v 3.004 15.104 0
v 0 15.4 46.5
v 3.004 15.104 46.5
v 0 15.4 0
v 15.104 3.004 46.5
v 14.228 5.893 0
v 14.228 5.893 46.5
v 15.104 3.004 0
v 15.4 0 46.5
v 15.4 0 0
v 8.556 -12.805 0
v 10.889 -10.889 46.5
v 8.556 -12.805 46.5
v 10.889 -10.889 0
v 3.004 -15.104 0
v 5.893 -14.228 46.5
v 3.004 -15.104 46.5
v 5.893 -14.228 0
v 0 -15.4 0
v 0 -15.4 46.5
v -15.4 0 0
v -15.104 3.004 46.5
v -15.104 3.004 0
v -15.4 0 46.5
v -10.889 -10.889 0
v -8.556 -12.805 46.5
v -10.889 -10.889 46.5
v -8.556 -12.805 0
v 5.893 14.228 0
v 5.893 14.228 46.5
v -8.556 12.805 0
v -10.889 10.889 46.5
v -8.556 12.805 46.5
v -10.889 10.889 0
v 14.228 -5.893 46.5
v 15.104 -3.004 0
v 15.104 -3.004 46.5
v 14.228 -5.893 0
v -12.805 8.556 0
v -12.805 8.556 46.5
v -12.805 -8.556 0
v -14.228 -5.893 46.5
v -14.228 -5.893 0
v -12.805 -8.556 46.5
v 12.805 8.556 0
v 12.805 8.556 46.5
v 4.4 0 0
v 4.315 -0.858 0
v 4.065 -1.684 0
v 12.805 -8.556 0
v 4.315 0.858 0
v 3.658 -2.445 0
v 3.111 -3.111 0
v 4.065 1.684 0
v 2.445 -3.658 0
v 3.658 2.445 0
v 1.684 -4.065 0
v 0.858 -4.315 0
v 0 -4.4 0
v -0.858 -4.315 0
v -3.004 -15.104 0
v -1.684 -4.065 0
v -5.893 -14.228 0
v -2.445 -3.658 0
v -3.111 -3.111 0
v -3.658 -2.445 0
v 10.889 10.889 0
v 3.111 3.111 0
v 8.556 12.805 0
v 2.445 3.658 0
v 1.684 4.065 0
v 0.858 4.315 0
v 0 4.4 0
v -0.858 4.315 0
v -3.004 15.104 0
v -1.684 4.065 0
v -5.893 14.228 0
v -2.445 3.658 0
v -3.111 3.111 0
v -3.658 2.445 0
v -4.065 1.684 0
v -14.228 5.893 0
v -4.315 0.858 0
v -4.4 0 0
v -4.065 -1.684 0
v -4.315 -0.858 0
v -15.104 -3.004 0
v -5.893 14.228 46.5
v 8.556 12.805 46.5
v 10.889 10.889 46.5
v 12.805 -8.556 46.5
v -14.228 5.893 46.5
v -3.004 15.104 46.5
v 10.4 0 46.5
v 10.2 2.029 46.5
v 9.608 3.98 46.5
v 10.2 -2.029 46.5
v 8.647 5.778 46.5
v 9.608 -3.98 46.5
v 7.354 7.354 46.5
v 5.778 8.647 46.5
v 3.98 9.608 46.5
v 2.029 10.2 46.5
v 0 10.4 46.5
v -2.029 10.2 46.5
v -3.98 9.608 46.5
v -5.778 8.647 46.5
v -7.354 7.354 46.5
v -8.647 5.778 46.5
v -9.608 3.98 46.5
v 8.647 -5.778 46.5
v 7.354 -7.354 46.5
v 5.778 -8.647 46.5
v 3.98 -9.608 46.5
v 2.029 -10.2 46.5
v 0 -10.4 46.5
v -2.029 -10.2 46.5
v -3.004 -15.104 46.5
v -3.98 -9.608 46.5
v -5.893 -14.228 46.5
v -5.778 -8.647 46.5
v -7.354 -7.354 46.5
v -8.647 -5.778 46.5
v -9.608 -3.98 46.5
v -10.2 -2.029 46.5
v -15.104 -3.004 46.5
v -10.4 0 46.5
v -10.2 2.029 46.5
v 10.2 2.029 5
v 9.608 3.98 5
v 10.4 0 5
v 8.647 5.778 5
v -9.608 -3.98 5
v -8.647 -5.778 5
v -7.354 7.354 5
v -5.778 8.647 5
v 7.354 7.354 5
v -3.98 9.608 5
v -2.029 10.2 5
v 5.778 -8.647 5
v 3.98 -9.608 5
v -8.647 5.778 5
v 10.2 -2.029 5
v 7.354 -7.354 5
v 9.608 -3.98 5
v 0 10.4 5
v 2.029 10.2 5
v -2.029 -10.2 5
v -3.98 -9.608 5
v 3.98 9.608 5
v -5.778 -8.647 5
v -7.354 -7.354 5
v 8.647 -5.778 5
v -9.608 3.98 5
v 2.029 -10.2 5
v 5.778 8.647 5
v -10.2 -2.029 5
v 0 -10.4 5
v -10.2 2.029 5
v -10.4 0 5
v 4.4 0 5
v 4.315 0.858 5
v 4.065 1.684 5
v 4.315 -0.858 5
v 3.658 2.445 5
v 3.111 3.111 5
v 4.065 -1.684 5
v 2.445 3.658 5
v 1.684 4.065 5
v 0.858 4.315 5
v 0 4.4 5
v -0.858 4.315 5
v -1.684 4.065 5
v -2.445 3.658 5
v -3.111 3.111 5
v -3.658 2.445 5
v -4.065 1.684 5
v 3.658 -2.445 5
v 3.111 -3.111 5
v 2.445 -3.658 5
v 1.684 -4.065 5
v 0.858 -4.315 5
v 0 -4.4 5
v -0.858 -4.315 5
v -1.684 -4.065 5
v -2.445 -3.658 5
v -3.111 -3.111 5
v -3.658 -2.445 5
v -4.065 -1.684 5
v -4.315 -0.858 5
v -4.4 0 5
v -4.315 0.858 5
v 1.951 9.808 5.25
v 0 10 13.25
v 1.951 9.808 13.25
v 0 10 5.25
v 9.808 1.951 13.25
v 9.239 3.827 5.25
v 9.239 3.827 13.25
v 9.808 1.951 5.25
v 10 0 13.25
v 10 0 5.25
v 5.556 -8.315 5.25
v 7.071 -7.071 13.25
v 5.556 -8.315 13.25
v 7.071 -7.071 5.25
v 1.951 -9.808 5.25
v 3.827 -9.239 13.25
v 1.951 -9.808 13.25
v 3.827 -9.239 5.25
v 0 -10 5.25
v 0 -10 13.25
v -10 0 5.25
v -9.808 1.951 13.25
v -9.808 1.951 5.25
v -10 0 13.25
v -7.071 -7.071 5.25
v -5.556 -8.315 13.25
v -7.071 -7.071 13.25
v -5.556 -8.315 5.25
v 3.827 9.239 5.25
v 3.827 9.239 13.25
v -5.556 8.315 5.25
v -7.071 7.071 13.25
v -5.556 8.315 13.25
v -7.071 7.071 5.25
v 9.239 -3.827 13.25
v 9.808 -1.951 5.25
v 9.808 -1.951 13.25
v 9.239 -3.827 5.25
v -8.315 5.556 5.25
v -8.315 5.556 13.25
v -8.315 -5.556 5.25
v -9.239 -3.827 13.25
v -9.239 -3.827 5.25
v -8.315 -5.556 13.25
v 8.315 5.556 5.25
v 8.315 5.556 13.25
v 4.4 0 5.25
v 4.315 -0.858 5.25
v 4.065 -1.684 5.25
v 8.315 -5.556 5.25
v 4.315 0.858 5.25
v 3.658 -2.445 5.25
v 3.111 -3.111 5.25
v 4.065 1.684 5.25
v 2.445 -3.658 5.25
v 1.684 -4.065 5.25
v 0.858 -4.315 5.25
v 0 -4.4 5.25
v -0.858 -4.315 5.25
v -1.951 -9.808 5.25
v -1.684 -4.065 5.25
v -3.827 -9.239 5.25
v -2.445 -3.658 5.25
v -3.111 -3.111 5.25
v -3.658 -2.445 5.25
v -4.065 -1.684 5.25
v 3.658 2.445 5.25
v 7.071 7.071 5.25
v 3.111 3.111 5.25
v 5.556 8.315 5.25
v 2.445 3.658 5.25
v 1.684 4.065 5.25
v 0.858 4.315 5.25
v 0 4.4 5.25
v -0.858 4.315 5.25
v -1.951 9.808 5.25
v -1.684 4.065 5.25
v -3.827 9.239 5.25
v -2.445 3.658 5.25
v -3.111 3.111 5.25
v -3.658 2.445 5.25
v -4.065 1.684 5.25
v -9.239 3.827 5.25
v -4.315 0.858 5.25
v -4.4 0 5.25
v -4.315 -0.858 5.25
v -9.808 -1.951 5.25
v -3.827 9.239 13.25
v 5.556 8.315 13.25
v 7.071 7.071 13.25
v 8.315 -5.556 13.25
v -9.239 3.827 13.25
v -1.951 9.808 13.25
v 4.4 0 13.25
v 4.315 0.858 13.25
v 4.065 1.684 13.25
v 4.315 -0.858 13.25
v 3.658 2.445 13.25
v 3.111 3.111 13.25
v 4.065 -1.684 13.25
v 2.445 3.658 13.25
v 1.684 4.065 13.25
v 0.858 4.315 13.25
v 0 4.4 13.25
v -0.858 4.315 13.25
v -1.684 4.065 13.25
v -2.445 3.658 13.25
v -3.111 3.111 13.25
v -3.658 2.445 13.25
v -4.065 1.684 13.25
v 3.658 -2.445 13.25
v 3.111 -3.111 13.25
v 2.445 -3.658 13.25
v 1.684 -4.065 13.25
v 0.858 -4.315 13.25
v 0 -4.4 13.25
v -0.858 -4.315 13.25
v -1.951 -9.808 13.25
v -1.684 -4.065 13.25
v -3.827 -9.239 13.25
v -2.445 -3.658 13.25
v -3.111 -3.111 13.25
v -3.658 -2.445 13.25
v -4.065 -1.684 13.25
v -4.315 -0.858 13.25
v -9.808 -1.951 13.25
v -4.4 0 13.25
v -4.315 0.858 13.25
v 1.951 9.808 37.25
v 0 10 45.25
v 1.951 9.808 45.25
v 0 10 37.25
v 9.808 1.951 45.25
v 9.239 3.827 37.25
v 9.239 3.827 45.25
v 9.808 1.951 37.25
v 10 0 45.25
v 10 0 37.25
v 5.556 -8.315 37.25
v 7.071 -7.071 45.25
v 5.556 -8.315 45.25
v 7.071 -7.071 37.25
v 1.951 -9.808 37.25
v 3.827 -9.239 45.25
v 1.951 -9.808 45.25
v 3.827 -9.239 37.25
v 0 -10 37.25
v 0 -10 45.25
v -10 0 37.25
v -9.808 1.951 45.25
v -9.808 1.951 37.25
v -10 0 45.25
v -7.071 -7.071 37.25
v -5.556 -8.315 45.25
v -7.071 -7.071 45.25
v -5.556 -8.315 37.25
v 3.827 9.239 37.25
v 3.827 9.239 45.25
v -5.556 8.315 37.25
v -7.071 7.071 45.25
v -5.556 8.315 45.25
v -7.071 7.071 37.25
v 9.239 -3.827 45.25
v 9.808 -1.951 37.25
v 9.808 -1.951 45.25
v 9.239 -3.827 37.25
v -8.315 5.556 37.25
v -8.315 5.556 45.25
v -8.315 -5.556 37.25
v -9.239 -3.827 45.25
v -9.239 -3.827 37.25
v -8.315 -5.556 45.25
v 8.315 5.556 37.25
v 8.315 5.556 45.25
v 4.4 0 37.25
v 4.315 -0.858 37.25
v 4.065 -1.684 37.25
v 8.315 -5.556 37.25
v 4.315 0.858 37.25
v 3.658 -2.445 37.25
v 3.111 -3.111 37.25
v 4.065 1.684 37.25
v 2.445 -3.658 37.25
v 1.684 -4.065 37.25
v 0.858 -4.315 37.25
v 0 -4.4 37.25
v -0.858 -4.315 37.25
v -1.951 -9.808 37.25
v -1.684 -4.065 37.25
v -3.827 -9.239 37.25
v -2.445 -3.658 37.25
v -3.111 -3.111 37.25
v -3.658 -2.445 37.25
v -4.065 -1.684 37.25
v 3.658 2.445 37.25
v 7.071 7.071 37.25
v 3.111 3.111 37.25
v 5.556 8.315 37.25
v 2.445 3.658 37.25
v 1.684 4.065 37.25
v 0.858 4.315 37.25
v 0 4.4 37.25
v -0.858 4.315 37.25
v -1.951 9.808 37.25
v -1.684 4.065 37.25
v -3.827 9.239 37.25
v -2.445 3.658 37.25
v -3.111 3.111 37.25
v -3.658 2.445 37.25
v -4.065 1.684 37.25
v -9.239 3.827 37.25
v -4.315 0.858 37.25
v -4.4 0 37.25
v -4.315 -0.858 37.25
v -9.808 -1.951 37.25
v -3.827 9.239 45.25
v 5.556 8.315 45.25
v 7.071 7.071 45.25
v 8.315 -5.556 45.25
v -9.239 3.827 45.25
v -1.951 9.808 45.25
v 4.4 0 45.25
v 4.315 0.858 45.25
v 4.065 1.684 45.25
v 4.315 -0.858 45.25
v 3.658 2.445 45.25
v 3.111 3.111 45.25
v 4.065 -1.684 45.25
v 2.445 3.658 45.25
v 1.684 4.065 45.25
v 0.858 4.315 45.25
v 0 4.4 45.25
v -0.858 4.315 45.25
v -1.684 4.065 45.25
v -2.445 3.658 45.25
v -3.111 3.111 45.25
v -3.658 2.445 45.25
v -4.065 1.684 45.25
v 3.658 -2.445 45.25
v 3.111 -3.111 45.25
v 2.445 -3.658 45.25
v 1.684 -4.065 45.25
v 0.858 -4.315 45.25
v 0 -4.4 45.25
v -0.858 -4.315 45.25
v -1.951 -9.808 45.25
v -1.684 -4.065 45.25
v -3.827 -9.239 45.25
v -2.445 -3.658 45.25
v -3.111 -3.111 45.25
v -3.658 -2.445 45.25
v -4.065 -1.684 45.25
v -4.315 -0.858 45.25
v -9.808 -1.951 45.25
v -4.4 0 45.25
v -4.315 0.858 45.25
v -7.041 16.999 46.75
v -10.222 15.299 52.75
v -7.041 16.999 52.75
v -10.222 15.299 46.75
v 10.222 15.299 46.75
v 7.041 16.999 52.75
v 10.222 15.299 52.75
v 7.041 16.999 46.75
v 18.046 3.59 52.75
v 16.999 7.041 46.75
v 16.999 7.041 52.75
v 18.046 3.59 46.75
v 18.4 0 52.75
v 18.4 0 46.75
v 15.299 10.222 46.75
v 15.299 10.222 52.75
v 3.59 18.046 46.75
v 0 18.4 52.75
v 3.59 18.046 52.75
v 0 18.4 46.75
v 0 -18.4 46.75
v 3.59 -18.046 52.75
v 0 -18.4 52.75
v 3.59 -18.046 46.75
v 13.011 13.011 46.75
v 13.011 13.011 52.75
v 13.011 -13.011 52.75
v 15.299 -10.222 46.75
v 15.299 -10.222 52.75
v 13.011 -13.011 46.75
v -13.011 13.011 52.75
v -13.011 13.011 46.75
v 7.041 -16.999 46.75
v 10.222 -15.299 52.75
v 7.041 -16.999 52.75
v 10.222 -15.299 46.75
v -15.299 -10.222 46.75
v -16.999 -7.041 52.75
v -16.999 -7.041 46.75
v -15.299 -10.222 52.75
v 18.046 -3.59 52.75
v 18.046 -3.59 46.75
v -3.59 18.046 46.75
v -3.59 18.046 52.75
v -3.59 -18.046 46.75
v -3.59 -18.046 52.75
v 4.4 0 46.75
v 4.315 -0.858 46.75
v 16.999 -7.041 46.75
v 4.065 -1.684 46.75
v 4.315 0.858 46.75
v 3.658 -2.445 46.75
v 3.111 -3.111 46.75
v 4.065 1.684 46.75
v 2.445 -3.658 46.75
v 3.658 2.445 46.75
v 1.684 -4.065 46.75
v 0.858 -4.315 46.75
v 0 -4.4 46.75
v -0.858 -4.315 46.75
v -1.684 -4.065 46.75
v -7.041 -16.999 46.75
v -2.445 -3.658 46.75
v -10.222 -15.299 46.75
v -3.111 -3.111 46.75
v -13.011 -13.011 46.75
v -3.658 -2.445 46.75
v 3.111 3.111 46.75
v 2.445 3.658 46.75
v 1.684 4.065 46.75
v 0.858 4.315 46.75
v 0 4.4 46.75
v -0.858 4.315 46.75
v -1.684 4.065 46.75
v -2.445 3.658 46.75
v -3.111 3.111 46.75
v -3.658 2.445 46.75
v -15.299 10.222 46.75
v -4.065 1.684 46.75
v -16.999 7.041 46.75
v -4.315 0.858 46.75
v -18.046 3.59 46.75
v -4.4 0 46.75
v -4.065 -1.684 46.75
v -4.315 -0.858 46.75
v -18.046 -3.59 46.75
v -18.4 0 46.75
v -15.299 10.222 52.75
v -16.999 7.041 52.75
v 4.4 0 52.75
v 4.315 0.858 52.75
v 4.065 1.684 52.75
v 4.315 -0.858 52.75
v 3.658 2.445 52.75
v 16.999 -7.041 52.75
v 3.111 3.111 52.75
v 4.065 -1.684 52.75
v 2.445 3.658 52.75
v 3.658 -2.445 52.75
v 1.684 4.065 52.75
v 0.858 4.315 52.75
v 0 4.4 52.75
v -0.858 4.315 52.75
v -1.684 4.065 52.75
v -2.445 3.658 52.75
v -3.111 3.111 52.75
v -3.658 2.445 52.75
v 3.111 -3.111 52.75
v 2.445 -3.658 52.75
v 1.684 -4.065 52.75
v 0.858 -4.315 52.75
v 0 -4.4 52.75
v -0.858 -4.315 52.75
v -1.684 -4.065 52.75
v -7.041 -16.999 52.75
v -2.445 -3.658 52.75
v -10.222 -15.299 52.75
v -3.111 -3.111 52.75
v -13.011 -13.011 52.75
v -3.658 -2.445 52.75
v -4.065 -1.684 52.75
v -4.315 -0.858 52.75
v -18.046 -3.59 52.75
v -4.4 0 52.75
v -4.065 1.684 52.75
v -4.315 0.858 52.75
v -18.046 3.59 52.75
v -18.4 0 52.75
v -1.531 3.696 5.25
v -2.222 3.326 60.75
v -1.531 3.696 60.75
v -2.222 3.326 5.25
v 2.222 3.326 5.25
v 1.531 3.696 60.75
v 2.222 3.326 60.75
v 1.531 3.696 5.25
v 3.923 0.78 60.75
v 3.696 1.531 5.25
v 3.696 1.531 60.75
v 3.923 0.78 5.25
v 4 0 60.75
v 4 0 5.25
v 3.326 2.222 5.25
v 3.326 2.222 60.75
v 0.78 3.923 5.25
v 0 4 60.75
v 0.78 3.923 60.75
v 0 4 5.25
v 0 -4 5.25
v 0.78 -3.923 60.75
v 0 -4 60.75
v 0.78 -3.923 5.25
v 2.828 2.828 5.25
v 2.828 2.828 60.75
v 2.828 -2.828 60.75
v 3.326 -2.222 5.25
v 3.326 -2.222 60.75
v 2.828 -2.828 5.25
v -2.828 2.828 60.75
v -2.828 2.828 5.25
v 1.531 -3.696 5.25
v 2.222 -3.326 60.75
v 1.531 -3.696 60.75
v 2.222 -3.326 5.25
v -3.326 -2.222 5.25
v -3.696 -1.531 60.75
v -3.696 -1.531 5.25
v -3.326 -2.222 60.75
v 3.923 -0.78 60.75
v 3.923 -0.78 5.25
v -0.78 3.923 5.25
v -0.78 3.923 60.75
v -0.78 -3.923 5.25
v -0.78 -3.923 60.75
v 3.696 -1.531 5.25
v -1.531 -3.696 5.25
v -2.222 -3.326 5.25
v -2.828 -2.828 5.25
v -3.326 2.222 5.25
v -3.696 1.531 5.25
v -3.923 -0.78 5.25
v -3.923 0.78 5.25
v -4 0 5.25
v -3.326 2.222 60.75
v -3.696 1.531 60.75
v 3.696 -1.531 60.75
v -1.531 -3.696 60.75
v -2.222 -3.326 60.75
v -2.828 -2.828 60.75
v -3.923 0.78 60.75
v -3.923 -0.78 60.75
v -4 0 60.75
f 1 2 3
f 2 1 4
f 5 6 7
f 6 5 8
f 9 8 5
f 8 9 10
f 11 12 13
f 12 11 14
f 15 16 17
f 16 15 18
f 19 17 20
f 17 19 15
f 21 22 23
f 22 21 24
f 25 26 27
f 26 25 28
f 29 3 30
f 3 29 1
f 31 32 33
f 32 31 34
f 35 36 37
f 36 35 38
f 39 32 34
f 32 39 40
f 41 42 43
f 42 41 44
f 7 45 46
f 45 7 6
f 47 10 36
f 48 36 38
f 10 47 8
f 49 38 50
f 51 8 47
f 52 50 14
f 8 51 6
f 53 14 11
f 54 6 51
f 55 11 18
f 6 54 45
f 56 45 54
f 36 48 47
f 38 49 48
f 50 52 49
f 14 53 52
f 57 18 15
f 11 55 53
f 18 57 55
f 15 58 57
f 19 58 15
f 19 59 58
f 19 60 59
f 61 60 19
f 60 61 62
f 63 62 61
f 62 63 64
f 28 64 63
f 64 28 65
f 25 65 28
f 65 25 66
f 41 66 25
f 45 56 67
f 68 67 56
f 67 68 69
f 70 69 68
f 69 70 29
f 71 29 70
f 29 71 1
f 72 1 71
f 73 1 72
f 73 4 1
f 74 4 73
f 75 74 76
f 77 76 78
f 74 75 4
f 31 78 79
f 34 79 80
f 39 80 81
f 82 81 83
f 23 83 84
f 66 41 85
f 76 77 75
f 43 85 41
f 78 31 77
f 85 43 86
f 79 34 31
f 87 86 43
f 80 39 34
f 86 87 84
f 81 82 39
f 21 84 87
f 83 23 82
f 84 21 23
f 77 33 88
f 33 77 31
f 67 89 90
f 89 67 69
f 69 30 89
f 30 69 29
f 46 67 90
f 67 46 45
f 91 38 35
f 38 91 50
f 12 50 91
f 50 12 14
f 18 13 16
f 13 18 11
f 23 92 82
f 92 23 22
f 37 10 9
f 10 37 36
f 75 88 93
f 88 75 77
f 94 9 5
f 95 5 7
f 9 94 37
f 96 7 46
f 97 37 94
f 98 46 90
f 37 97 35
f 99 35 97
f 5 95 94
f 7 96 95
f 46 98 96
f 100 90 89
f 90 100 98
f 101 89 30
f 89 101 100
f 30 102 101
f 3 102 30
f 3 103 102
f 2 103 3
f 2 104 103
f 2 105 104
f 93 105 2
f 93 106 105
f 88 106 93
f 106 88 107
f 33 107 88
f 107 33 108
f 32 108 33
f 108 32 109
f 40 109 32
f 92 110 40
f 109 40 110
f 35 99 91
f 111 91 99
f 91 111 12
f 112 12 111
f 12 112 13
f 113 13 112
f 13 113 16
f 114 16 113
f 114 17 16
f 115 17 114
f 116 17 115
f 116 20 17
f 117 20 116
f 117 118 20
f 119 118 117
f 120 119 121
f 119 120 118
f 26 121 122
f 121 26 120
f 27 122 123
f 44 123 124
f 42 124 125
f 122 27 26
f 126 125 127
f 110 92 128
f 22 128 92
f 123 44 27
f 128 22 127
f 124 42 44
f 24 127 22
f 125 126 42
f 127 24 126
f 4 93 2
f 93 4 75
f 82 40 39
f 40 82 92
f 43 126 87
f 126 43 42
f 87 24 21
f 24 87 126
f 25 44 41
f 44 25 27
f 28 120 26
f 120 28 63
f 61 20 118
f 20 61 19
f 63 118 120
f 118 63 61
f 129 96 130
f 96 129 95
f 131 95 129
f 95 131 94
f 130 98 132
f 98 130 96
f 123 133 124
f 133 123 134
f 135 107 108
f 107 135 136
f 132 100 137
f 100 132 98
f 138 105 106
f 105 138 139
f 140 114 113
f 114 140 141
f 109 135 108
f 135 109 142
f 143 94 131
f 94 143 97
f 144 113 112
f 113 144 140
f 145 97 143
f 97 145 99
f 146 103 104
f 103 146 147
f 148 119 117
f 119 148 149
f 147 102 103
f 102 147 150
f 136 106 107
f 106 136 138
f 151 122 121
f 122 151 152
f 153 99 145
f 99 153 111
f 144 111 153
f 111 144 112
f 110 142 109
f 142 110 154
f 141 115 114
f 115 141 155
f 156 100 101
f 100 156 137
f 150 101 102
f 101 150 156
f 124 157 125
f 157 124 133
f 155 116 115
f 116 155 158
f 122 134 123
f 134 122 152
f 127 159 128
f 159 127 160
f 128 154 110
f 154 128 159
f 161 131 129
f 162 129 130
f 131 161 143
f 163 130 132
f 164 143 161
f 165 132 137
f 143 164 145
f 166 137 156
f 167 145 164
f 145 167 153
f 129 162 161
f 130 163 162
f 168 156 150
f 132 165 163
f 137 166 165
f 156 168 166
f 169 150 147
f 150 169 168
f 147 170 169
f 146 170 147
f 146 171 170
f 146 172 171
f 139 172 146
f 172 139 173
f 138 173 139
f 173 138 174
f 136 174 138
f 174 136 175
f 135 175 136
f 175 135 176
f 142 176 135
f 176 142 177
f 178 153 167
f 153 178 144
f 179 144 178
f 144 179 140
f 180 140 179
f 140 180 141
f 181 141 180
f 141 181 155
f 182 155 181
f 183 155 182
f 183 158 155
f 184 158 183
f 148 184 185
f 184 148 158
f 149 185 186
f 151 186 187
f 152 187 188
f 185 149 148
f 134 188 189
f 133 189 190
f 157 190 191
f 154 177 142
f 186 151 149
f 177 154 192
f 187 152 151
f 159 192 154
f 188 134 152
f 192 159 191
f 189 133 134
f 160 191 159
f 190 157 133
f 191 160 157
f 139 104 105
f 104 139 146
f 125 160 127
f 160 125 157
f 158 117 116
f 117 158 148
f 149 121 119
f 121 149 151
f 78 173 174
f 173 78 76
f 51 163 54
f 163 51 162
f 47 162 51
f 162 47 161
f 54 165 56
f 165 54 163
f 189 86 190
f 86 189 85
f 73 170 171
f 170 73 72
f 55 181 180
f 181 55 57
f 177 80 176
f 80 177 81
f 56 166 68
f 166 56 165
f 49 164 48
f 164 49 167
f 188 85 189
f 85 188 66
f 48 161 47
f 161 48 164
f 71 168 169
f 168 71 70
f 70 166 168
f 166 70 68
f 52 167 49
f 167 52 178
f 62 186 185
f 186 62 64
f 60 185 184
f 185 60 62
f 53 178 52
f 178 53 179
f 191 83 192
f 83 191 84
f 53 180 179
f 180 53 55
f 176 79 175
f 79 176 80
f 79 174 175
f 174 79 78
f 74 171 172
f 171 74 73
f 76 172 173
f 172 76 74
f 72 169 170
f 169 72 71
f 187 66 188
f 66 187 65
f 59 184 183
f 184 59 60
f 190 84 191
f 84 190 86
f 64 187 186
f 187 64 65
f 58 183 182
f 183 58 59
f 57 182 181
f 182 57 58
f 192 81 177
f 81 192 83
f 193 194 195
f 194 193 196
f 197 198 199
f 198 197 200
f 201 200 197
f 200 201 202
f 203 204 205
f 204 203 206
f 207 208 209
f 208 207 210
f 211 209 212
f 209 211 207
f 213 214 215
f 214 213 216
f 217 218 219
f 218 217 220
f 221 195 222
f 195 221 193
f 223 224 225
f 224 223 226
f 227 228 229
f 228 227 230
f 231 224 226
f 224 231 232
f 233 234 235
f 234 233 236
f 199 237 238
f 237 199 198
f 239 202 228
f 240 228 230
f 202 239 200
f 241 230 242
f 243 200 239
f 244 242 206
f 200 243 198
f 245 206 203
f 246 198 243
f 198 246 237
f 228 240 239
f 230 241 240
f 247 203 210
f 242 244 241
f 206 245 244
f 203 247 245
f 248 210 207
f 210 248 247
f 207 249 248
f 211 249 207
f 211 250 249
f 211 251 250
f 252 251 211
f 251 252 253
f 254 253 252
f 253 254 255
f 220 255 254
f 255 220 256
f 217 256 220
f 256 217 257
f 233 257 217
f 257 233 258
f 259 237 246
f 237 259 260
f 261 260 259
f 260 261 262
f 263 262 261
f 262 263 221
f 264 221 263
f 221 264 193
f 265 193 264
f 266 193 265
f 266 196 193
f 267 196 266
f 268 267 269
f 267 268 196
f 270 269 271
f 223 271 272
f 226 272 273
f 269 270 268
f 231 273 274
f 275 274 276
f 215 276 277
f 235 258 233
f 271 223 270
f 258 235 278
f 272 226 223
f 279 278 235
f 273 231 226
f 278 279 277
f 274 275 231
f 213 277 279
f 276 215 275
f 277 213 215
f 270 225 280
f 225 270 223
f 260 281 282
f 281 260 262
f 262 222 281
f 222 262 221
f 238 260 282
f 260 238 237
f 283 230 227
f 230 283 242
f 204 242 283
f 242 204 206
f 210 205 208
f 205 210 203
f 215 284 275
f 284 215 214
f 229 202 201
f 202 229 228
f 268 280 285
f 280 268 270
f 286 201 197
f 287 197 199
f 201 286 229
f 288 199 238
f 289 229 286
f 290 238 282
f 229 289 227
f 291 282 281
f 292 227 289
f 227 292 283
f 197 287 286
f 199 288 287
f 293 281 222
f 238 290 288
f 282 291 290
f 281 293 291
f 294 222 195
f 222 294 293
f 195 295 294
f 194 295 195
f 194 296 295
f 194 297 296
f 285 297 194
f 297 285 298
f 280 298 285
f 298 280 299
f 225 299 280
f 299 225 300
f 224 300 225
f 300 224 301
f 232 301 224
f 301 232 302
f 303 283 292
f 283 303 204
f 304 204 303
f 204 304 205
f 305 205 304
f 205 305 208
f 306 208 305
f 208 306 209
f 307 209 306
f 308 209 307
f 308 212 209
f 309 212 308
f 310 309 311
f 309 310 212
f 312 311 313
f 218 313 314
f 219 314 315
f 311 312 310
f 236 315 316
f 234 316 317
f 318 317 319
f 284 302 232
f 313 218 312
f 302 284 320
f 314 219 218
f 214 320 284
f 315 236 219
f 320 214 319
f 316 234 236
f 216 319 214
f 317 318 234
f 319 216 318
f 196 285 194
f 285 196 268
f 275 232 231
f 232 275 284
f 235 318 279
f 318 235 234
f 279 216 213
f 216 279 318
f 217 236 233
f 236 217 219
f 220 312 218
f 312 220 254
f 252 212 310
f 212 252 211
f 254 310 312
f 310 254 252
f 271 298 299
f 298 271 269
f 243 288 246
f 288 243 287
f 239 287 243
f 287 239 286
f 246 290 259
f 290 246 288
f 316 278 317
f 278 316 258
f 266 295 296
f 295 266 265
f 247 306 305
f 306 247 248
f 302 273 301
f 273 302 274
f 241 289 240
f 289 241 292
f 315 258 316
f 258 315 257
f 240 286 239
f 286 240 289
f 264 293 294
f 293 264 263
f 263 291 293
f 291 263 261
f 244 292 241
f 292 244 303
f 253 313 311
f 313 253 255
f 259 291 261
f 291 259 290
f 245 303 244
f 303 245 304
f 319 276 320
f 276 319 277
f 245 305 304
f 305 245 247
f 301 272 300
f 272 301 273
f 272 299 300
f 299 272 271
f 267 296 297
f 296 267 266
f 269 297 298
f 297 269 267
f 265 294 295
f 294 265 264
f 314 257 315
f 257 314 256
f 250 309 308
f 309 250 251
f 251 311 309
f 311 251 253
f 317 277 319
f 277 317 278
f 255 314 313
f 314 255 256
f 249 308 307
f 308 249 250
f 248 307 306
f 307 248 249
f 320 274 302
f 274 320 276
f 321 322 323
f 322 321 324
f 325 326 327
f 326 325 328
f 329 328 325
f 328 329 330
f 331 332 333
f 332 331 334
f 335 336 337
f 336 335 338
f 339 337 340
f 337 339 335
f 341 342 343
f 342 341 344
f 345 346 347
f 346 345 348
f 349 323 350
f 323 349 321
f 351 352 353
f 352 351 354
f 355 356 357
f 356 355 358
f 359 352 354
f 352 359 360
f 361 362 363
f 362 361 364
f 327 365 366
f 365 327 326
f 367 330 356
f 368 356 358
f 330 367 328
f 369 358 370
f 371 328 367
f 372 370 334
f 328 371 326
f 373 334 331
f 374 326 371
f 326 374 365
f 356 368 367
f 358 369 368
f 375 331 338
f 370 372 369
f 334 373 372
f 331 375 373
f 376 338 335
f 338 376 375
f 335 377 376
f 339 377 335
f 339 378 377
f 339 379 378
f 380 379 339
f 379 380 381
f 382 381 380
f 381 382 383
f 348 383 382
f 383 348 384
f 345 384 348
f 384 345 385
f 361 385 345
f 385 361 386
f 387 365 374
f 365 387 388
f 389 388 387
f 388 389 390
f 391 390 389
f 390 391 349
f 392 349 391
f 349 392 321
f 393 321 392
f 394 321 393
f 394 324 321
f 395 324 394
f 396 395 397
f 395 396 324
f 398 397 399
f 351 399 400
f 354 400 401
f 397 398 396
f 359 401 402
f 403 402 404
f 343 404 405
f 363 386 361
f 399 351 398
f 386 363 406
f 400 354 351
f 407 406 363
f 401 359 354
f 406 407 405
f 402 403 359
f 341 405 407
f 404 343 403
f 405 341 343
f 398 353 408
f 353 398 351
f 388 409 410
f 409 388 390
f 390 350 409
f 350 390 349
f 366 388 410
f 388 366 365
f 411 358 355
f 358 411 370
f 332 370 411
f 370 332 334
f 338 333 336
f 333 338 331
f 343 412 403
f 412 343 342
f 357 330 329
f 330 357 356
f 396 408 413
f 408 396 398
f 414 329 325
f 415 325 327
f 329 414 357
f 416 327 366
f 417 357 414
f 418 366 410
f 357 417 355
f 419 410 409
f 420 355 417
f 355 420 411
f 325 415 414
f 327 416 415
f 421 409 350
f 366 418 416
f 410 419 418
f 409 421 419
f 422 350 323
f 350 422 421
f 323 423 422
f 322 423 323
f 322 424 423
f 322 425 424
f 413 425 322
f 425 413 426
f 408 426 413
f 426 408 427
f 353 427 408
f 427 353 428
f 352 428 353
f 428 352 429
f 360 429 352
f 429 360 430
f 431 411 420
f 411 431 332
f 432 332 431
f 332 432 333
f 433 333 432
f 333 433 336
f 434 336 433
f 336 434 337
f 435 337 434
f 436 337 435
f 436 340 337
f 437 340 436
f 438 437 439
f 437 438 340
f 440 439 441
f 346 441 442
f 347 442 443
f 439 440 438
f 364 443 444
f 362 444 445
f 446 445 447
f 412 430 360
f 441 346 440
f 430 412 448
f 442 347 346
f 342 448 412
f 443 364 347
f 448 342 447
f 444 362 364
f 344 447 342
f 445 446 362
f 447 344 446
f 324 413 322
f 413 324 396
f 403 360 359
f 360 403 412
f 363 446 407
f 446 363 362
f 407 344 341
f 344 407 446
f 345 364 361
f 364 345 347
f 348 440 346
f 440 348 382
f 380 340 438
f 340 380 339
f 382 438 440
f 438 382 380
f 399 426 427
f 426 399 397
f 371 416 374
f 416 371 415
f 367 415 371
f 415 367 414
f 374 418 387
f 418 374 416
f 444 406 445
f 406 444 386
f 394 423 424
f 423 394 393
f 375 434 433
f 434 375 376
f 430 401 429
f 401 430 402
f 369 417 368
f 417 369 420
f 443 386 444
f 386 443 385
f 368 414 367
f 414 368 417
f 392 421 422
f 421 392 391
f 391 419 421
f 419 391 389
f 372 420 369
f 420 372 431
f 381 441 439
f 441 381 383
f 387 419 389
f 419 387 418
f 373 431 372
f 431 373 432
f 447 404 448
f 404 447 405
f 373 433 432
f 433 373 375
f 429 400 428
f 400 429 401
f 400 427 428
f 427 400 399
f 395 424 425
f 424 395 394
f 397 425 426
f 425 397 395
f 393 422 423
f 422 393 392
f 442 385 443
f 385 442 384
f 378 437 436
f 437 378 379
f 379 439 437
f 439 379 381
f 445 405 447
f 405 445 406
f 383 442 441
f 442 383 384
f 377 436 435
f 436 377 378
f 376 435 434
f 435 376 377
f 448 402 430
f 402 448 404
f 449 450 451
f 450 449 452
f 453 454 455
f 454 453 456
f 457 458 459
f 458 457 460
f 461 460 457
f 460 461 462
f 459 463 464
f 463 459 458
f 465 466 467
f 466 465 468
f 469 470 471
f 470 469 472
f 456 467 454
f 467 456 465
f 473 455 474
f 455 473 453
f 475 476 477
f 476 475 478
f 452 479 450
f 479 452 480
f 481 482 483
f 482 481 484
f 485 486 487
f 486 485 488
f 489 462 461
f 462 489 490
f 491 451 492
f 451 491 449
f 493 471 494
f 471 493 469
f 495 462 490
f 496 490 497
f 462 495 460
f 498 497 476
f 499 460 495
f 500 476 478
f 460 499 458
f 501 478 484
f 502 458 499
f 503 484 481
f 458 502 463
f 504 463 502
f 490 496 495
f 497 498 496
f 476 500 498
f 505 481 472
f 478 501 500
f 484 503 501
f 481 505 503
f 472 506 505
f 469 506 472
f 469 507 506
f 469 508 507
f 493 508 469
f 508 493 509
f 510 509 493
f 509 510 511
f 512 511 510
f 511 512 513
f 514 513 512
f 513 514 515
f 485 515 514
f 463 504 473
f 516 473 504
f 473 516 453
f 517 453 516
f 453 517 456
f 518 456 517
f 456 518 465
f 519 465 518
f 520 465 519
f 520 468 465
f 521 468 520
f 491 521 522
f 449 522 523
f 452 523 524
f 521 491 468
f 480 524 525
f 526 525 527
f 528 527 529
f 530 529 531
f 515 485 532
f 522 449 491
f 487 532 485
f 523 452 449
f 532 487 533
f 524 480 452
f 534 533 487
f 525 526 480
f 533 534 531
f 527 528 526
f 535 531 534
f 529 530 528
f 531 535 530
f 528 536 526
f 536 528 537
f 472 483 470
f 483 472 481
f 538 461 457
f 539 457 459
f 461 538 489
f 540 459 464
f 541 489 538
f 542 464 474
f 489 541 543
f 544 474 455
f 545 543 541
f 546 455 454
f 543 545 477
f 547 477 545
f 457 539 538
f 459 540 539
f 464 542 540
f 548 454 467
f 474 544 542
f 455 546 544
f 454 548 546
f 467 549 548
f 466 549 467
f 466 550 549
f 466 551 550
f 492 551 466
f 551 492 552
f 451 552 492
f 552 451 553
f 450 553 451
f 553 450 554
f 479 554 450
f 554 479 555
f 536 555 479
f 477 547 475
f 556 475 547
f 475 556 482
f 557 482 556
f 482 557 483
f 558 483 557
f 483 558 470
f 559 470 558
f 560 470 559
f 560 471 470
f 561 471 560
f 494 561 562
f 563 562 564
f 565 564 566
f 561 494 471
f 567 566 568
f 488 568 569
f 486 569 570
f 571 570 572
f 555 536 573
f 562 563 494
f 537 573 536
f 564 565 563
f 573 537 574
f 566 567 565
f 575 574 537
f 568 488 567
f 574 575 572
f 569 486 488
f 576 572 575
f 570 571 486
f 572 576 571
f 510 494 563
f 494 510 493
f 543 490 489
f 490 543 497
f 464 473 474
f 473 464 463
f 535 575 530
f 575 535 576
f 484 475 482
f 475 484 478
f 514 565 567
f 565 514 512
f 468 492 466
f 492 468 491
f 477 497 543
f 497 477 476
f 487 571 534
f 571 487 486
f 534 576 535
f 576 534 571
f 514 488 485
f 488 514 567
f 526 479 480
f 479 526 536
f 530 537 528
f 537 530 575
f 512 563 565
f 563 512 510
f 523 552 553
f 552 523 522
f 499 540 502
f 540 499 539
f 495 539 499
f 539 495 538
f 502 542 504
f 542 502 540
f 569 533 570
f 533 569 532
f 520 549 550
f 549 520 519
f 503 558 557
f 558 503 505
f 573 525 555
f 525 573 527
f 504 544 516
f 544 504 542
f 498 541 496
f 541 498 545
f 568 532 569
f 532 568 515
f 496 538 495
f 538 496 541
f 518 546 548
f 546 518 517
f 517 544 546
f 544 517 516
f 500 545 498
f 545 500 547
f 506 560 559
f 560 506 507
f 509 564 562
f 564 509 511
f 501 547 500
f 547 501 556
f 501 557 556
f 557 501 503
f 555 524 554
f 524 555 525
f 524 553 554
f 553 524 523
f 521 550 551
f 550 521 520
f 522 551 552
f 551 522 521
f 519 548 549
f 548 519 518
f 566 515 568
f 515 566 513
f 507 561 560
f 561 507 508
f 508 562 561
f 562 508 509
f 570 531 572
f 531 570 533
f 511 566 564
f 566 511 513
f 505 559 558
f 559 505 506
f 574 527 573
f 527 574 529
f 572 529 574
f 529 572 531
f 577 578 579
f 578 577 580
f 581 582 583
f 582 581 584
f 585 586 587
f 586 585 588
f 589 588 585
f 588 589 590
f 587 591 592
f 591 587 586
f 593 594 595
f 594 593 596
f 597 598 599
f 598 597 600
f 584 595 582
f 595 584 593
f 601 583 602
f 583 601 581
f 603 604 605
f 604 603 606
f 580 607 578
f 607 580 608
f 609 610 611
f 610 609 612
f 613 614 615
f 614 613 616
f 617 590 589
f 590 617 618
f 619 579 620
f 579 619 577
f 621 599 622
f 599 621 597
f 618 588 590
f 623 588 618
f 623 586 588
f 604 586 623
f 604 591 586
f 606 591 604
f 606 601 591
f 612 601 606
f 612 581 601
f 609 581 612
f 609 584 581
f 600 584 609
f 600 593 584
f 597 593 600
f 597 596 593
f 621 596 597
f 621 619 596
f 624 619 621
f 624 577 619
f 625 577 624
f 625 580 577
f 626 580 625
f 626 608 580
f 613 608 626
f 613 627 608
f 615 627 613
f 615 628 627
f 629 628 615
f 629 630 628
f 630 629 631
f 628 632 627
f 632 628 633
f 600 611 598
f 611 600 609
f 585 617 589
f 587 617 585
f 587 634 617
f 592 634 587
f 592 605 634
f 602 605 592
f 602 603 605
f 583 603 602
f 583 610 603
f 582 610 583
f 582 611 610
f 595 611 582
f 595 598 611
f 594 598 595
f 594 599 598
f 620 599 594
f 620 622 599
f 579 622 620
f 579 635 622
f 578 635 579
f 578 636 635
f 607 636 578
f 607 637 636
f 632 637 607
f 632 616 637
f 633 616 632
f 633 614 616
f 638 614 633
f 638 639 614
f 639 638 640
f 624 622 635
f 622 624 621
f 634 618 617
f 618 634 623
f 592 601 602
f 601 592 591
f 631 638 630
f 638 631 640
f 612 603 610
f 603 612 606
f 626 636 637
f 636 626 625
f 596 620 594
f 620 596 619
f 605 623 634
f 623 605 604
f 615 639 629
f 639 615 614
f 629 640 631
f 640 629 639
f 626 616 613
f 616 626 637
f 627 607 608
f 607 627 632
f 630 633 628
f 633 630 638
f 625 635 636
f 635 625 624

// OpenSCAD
$fn = 32;

// ------------------------------------------------------------------------
// Shaft station: cup d30.8 x 46.5 mm, shaft d8
// Every part is its own module, assembly() places every instance.
// ------------------------------------------------------------------------

// --- part 1 ---
module housing_cup() {
  difference() {
    cylinder(h = 46.5, d = 30.8);
    translate([0, 0, 5]) cylinder(h = 42.5, d = 20.8);
    translate([0, 0, -1]) cylinder(h = 7, d = 8.8);
  }
}

// --- part 2 ---
module bearing_lower() {
  difference() {
      translate([0, 0, 0]) cylinder(h = 8, d = 20);
      translate([0, 0, -1]) cylinder(h = 10, d = 8.8);
    }
}

// --- part 3 ---
module bearing_upper() {
  difference() {
      translate([0, 0, 0]) cylinder(h = 8, d = 20);
      translate([0, 0, -1]) cylinder(h = 10, d = 8.8);
    }
}

// --- part 4 ---
module station_shaft() {
  translate([0, 0, -27.75]) cylinder(h = 55.5, d = 8);
}

// --- part 5 ---
module station_cover() {
  difference() {
    cylinder(h = 6, d = 36.8);
    translate([0, 0, -1]) cylinder(h = 8, d = 8.8);
  }
}

// --- assembly ---
module assembly() {
  color([0.80, 0.24, 0.20]) translate([0, 0, 0]) rotate([0, 0, 0]) housing_cup();
  color([0.20, 0.45, 0.75]) translate([0, 0, 5.25]) rotate([0, 0, 0]) bearing_lower();
  color([0.25, 0.62, 0.32]) translate([0, 0, 37.25]) rotate([0, 0, 0]) bearing_upper();
  color([0.92, 0.70, 0.18]) translate([0, 0, 33]) rotate([0, 0, 0]) station_shaft();
  color([0.58, 0.35, 0.70]) translate([0, 0, 46.75]) rotate([0, 0, 0]) station_cover();
}

assembly();
